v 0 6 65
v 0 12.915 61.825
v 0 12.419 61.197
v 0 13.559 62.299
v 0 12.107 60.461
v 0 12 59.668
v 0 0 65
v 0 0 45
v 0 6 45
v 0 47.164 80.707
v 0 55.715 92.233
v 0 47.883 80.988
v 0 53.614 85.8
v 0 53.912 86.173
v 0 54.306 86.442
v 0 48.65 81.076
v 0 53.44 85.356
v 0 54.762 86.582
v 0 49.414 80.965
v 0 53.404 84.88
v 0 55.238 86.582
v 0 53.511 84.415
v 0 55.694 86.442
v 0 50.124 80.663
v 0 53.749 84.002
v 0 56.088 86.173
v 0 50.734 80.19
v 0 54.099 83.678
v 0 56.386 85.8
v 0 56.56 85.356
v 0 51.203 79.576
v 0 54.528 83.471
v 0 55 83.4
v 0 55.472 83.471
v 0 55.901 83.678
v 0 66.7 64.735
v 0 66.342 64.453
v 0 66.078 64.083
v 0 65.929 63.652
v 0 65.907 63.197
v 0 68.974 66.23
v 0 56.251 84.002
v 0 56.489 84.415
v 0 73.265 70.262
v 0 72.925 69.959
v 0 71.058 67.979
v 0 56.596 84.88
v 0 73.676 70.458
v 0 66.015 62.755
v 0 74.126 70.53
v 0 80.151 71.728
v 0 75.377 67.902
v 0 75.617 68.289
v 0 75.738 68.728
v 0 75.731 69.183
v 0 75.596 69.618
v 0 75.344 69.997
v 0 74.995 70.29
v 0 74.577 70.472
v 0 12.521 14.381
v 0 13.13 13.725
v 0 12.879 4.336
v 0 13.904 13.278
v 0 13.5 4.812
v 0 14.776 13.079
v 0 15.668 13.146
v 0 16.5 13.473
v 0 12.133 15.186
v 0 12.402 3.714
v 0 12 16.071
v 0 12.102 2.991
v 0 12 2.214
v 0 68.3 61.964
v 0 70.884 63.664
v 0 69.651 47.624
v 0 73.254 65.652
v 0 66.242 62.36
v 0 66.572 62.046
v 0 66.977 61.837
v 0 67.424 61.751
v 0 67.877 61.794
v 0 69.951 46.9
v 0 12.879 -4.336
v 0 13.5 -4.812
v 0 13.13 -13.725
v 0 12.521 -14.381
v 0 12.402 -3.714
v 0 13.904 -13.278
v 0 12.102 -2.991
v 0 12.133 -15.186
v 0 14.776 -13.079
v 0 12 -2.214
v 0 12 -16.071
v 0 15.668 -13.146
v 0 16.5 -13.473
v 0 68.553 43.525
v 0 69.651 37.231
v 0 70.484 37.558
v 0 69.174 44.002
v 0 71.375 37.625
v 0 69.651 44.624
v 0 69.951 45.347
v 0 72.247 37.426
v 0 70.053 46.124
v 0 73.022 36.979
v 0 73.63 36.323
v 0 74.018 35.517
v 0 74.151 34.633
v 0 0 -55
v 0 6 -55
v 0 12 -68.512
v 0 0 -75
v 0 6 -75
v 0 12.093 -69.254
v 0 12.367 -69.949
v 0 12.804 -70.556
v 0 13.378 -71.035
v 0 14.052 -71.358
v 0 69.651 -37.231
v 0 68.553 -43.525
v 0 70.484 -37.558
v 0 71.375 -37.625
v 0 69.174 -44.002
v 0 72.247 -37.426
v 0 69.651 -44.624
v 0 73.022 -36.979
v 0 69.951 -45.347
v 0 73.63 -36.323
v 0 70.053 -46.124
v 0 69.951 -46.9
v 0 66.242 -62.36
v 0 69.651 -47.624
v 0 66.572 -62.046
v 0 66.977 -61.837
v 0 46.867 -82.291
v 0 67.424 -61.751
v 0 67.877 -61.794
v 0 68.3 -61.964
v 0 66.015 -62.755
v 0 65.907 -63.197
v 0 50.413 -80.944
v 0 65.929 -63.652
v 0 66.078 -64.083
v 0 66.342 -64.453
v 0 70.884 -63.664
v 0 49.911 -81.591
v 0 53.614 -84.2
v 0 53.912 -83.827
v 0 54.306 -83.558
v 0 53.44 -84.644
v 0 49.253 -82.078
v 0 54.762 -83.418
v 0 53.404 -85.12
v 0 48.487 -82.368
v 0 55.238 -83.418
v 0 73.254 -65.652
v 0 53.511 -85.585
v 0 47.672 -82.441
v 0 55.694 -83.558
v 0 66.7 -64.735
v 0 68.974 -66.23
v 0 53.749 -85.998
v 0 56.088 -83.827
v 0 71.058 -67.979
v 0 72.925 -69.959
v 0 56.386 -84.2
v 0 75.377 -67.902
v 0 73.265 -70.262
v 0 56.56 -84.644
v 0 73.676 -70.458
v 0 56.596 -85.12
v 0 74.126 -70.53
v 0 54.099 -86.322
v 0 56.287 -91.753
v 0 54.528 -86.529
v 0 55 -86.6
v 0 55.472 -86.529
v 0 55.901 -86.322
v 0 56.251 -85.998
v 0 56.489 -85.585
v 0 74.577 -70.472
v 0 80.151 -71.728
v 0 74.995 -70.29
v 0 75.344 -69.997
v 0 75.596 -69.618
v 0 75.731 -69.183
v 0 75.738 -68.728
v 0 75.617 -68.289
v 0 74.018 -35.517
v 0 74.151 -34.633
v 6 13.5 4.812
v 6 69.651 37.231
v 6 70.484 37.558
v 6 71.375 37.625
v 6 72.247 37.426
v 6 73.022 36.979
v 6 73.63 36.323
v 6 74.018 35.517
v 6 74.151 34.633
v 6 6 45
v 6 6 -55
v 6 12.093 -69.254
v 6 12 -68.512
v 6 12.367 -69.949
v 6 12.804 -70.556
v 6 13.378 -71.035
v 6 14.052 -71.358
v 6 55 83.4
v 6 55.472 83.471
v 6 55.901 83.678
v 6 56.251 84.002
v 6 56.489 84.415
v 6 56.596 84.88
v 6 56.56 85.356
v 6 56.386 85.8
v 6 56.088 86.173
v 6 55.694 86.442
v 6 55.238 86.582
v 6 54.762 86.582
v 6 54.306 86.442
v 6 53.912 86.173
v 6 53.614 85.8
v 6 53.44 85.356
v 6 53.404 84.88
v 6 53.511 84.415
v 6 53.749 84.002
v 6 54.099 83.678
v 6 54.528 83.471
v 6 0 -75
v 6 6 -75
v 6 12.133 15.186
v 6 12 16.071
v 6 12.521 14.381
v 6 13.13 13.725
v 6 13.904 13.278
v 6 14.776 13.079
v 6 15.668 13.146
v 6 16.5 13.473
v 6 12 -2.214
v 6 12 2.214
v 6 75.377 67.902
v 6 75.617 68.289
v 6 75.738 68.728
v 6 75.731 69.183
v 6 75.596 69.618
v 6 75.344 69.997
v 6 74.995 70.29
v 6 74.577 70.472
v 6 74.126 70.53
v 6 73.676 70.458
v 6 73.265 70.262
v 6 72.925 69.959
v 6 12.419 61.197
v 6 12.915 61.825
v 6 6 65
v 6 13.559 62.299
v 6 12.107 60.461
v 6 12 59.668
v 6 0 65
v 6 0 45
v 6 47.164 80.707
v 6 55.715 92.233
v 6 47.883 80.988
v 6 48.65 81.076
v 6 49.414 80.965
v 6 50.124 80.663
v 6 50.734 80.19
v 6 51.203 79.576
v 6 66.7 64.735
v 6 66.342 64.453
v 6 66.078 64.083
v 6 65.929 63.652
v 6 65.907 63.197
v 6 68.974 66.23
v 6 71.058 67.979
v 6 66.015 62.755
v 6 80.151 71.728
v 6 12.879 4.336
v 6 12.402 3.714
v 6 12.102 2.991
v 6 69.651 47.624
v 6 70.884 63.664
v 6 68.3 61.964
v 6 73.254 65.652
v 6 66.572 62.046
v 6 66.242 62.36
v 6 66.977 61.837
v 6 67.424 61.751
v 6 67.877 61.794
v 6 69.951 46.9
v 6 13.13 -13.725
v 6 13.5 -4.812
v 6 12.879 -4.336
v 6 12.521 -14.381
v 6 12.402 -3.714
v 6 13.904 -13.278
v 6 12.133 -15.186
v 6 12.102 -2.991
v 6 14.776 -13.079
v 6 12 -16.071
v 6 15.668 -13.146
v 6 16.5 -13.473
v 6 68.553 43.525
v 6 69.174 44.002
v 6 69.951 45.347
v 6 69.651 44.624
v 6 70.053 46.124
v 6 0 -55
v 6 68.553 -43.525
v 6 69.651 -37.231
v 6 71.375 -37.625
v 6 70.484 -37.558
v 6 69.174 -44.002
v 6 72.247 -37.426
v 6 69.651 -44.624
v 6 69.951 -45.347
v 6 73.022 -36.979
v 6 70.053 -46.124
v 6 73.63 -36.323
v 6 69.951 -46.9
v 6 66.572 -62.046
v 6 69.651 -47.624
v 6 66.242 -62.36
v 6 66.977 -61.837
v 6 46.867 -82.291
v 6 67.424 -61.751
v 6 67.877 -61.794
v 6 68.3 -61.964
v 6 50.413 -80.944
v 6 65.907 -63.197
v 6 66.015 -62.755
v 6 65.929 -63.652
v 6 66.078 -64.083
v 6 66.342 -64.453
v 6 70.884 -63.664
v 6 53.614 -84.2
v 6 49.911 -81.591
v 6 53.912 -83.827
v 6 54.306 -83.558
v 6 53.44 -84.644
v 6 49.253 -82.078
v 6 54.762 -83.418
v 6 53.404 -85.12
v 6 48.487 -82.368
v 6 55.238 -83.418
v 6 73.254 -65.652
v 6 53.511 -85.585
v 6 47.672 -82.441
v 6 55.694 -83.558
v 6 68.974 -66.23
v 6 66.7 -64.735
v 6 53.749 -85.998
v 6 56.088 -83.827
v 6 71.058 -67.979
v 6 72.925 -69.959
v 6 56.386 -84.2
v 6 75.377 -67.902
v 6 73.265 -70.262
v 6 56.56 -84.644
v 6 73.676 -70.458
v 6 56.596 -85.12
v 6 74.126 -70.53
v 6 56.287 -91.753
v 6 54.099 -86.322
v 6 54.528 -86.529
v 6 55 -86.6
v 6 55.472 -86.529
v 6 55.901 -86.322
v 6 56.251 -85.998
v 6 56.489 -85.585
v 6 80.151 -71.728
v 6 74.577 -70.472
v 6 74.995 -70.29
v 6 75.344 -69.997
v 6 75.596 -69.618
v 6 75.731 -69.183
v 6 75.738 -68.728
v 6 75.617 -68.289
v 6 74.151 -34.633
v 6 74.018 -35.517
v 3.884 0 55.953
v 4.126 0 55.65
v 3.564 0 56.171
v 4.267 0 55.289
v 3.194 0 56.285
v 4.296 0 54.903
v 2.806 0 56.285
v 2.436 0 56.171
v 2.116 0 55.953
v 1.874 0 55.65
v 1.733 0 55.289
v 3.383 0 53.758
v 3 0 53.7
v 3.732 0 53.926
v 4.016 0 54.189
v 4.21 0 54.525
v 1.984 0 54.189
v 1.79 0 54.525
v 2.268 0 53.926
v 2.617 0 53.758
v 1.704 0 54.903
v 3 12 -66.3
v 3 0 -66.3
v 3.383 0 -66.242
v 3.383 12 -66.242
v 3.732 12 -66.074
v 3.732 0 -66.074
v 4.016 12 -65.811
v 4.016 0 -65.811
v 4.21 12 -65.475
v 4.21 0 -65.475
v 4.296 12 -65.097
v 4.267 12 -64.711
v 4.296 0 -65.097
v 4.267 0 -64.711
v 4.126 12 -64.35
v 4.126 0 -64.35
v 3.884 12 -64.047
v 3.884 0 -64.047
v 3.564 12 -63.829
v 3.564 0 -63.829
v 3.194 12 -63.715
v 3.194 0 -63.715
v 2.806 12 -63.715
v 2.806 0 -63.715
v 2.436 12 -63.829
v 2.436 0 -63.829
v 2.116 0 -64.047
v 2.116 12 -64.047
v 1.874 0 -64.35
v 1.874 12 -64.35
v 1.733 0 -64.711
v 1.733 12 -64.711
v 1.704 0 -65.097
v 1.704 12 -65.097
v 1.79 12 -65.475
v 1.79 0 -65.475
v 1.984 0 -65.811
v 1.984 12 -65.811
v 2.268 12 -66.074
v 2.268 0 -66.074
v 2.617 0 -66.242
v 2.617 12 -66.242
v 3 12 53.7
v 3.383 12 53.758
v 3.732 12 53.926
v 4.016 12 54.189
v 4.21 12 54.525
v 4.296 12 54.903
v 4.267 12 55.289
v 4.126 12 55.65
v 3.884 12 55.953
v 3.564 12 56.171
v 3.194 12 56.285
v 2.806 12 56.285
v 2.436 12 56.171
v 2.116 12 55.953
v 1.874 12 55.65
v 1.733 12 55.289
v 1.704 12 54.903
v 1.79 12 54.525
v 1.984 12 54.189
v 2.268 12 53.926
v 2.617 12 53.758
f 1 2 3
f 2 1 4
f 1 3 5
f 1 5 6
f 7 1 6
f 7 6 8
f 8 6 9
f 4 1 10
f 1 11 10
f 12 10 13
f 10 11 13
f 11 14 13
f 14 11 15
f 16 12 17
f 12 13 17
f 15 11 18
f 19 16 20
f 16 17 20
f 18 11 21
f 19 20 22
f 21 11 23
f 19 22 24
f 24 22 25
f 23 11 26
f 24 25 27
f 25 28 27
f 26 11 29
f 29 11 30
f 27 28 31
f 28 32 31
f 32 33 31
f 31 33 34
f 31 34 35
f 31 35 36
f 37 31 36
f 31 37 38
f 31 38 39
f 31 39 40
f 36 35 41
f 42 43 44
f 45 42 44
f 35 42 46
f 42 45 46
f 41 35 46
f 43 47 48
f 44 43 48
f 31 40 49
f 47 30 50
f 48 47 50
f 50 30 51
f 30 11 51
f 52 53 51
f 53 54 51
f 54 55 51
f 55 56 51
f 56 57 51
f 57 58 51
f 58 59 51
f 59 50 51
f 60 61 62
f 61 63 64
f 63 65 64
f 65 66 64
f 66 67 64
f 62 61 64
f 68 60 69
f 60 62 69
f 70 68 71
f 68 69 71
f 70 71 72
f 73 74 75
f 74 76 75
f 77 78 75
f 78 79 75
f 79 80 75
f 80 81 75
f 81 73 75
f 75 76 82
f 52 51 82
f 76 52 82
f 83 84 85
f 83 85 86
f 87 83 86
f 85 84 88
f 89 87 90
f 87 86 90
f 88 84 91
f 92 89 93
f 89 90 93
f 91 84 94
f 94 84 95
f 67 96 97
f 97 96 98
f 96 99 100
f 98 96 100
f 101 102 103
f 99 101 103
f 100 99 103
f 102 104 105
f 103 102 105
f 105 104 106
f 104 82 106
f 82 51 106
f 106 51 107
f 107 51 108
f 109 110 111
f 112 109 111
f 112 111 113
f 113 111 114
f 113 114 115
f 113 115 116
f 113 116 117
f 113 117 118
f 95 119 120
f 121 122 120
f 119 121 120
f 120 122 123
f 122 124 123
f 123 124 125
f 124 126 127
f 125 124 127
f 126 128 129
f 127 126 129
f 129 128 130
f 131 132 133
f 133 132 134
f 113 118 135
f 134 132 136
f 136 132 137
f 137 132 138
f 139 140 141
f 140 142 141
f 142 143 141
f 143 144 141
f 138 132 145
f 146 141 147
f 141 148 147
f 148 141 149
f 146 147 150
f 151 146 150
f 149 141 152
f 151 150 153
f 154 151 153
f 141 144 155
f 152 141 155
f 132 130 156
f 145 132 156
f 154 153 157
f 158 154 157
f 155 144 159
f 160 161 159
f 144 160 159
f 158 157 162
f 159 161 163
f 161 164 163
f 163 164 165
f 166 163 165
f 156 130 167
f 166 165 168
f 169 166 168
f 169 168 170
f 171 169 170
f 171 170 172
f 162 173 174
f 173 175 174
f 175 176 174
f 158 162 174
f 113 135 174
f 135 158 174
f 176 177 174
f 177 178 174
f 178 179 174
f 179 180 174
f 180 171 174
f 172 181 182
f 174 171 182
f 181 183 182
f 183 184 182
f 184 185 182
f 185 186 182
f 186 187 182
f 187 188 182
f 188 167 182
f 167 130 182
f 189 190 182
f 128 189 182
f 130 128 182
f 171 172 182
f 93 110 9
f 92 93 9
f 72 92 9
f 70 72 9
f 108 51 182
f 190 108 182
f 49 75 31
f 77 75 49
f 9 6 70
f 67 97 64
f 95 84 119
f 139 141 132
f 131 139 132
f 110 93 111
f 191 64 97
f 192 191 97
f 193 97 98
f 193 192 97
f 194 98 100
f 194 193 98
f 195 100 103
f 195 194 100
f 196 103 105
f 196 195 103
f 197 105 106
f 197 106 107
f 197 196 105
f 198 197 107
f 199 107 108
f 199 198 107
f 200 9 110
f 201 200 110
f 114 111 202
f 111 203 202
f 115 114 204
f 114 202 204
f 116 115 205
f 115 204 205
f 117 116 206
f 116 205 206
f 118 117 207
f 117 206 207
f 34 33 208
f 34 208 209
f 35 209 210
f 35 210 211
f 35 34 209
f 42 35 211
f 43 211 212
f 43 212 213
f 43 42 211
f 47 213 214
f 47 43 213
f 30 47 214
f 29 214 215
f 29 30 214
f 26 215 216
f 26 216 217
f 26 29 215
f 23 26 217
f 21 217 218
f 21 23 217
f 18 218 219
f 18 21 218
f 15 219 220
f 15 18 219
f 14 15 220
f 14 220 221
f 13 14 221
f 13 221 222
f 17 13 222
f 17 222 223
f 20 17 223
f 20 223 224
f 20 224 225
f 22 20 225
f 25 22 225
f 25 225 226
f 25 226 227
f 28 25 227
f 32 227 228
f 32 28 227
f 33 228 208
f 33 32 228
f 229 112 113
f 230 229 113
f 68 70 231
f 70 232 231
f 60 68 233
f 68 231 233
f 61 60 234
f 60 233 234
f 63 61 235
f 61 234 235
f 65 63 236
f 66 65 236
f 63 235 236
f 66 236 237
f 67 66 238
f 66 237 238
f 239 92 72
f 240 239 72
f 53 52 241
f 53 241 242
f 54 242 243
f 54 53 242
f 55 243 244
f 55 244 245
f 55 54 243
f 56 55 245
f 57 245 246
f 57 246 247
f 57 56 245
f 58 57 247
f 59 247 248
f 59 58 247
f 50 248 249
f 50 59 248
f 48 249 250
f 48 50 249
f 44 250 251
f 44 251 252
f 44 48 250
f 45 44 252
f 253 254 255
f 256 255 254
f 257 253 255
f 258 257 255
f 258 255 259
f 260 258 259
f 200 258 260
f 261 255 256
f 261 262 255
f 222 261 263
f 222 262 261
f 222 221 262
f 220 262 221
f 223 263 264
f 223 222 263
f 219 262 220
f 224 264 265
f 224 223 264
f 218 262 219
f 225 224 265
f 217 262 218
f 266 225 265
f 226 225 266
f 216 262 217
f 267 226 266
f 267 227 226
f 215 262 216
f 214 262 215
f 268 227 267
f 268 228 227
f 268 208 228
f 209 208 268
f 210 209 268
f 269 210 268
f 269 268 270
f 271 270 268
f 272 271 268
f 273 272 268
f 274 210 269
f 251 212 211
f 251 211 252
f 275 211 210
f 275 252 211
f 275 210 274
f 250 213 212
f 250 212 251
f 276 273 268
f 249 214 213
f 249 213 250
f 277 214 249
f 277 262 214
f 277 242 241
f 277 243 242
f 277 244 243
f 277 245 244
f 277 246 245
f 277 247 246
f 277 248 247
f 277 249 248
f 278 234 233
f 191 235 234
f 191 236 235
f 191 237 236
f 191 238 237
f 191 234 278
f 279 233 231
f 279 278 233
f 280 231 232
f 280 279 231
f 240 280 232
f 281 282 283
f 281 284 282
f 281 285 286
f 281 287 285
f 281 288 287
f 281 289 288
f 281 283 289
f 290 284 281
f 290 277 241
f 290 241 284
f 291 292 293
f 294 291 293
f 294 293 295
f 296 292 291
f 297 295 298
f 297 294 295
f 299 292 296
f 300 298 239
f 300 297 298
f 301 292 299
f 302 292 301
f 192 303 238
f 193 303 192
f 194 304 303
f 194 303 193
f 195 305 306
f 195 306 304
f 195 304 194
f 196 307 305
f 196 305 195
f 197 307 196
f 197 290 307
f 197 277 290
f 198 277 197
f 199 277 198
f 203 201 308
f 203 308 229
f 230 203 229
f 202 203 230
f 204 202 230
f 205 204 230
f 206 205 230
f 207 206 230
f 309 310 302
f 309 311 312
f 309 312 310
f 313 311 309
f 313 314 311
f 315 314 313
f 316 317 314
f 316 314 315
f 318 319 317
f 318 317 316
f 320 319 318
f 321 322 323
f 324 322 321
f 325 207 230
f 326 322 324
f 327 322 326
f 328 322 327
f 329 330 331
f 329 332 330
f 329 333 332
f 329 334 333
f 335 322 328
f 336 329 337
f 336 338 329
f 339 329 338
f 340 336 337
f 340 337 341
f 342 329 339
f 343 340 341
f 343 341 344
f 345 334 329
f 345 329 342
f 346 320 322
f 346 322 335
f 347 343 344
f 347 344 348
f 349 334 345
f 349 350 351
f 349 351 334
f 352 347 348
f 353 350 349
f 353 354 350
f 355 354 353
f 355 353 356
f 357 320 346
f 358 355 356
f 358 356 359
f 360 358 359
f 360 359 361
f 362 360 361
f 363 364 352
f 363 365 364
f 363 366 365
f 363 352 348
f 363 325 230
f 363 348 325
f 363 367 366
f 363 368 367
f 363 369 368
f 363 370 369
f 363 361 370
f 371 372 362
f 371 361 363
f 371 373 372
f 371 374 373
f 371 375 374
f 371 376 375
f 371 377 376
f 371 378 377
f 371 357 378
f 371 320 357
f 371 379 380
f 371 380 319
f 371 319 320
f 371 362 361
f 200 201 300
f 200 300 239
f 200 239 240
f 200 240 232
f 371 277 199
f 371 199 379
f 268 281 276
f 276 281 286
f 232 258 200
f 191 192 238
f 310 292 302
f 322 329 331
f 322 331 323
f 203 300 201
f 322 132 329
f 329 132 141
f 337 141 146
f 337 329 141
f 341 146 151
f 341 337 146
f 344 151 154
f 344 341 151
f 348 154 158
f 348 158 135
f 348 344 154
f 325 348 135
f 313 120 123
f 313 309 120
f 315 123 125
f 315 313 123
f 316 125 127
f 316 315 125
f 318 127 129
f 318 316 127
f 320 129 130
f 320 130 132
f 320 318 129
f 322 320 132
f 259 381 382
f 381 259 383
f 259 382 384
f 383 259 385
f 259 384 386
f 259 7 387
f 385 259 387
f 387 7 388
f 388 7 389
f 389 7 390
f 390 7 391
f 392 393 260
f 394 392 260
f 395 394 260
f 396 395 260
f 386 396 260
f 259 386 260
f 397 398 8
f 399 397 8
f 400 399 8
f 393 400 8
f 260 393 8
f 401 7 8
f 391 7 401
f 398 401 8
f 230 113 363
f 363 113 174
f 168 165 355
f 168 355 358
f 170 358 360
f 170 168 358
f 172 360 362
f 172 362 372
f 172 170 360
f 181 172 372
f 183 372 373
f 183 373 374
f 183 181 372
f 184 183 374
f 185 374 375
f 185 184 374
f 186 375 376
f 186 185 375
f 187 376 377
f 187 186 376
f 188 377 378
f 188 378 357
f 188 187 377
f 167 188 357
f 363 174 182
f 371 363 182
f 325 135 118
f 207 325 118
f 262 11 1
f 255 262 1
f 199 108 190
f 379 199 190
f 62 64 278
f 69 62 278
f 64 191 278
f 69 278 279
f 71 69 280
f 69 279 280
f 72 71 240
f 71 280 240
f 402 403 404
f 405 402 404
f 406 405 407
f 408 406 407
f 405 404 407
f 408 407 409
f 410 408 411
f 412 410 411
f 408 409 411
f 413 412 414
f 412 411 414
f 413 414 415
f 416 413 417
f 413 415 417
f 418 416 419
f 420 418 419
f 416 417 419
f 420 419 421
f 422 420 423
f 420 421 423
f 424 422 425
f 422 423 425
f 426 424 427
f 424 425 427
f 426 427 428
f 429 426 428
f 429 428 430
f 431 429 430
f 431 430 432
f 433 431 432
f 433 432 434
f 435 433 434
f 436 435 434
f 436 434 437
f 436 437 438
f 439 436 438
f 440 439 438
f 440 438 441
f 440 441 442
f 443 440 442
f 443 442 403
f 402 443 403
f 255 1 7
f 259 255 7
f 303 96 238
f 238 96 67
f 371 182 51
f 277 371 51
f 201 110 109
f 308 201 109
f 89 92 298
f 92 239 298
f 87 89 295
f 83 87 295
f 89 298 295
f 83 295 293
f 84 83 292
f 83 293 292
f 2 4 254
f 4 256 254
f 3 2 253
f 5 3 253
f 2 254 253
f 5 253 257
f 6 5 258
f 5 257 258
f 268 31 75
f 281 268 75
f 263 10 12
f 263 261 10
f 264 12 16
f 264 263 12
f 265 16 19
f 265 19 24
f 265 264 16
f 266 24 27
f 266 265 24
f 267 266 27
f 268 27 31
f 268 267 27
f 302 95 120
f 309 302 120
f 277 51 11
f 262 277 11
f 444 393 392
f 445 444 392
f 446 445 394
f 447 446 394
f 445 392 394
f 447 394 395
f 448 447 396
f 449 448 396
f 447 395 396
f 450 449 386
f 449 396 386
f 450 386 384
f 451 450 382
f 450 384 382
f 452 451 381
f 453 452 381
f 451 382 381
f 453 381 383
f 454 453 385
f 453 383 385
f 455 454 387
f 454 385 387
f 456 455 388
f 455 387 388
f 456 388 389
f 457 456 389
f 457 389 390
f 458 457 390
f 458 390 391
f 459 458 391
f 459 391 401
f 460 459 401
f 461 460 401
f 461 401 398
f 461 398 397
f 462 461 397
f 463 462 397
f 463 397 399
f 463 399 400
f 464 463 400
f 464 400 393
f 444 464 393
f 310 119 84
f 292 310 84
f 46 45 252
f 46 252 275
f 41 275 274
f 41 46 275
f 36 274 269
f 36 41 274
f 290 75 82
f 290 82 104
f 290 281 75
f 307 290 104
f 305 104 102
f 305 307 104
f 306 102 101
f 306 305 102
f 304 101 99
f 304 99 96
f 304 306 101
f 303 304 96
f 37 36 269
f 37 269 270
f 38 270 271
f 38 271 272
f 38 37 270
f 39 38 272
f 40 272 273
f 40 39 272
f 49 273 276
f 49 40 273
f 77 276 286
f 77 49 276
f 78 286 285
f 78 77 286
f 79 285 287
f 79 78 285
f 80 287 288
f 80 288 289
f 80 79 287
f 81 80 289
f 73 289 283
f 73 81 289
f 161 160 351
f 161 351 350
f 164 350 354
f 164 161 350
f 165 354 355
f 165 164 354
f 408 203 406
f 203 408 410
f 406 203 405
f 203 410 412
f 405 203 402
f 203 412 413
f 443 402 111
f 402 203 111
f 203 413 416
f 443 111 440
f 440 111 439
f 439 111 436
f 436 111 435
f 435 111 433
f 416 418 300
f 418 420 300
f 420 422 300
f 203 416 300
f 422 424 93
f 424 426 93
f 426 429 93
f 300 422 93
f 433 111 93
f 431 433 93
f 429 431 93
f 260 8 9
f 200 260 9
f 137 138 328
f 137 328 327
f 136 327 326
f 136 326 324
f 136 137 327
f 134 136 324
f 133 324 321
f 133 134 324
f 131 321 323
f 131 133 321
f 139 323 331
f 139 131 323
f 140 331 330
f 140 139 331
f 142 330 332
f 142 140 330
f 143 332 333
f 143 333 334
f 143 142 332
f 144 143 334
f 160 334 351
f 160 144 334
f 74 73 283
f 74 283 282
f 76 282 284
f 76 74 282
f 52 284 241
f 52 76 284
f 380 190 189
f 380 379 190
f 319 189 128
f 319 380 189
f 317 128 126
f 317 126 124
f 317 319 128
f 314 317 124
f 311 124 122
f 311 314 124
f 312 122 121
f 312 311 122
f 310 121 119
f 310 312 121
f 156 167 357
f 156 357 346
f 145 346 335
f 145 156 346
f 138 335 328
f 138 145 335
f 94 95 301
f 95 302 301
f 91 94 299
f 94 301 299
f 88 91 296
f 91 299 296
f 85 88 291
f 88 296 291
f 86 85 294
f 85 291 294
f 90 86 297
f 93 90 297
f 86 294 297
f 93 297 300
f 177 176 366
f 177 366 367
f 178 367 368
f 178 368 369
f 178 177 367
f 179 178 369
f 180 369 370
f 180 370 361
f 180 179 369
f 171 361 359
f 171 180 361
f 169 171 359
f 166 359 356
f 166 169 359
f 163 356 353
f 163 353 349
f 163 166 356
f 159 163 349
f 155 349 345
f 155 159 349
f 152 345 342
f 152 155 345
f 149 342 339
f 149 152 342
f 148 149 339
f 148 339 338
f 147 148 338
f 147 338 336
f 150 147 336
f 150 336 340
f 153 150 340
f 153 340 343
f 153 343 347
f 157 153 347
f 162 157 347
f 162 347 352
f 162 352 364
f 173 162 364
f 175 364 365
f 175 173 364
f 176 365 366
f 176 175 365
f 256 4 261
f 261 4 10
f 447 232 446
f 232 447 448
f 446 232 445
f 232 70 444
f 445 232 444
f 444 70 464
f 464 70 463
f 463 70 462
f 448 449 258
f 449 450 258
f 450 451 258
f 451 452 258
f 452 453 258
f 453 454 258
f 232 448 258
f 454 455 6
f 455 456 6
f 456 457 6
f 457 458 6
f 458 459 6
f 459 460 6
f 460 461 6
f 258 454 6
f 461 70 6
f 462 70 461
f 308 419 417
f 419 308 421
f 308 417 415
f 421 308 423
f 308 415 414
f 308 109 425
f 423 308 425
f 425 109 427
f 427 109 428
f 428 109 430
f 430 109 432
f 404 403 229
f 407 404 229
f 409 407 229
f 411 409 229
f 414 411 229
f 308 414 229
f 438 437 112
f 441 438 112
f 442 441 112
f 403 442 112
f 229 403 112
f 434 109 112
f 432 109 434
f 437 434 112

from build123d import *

# Parameters (mm, degrees)
SKETCH1_R           = 1.6
BOSS_EXTRUDE1_DEPTH = 6
FILLET1_R           = 3
CUT_EXTRUDE1_REACH  = 124.34
SKETCH2_R           = 1.3


with BuildPart() as part:
    # Sketch1 → Boss-Extrude1 (new body)
    with BuildSketch(Plane(origin=(0, 0, 0), x_dir=(0, 0, -1), z_dir=(1, 0, 0))):
        Polygon((-65, 0), (-45, 0), (-45, 6), (55, 6), (55, 0), (75, 0), (75, 6), (91.752837084, 56.286625106), (71.728155707, 80.151111078), (-71.728155707, 80.151111078), (-92.232725383, 55.714716502), (-65, 6), align=None)
        with Locations((-85, 55)):
            Circle(SKETCH1_R, mode=Mode.SUBTRACT)
        with Locations((85, 55)):
            Circle(SKETCH1_R, mode=Mode.SUBTRACT)
        Polygon((-82.116733572, 49.736451418), (-45.025455014, 71.151111078), (-10.874545111, 12), (-61.445461749, 12), align=None, mode=Mode.SUBTRACT)
        Polygon((-39.829302592, 74.151111078), (39.829302592, 74.151111078), (3.94634188, 12), (-3.94634188, 12), align=None, mode=Mode.SUBTRACT)
        Polygon((45.025455014, 71.151111078), (83.06422235, 49.189418517), (70.674680035, 12), (10.874545111, 12), align=None, mode=Mode.SUBTRACT)
        with BuildLine():
            ThreePointArc((-61.963724259, 68.3), (-64.623217813, 72.098150418), (-67.901849582, 75.376782187))
            ThreePointArc((-67.901849582, 75.376782187), (-70.155980867, 75.179571253), (-69.958769933, 72.925439969))
            ThreePointArc((-69.958769933, 72.925439969), (-67.074560031, 70.041230067), (-64.735005551, 66.7))
            ThreePointArc((-64.735005551, 66.7), (-62.549364905, 66.114359354), (-61.963724259, 68.3))
        make_face(mode=Mode.SUBTRACT)
        with BuildLine():
            ThreePointArc((67.901849582, 75.376782187), (64.623217813, 72.098150418), (61.963724259, 68.3))
            ThreePointArc((61.963724259, 68.3), (62.549364905, 66.114359354), (64.735005551, 66.7))
            ThreePointArc((64.735005551, 66.7), (67.074560031, 70.041230067), (69.958769933, 72.925439969))
            ThreePointArc((69.958769933, 72.925439969), (70.155980867, 75.179571253), (67.901849582, 75.376782187))
        make_face(mode=Mode.SUBTRACT)
    extrude(amount=BOSS_EXTRUDE1_DEPTH)

    # Fillet1
    fillet1_edges = [part.edges().sort_by_distance(p)[0] for p in [
        (3, 49.736451418, 82.116733572),
        (3, 12, 61.445461749),
        (3, 12, 10.874545111),
        (3, 71.151111078, 45.025455014),
        (3, 74.151111078, 39.829302592),
        (3, 12, 3.94634188),
        (3, 12, -3.94634188),
        (3, 74.151111078, -39.829302592),
        (3, 71.151111078, -45.025455014),
        (3, 12, -10.874545111),
        (3, 12, -70.674680035),
        (3, 49.189418517, -83.06422235),
    ]]
    fillet(fillet1_edges, radius=FILLET1_R)

    # Sketch2 → Cut-Extrude1 (cut, up to next)
    with BuildSketch(Plane.XZ, mode=Mode.PRIVATE) as cut_extrude1_sk1:
        with Locations(Location((3, 55, 0), (0, 0, 270))):
            Circle(SKETCH2_R)
    cut_extrude1_tool1 = extrude(cut_extrude1_sk1.sketch, amount=-CUT_EXTRUDE1_REACH, mode=Mode.PRIVATE) & part.part
    # Sketch2 → Cut-Extrude1 (cut, up to next)
    with BuildSketch(Plane.XZ, mode=Mode.PRIVATE) as cut_extrude1_sk2:
        with Locations(Location((3, -65, 0), (0, 0, 270))):
            Circle(SKETCH2_R)
    cut_extrude1_tool2 = extrude(cut_extrude1_sk2.sketch, amount=-CUT_EXTRUDE1_REACH, mode=Mode.PRIVATE) & part.part
    add(cut_extrude1_tool1.solids().sort_by_distance((3, 0, 55))[0], mode=Mode.SUBTRACT)
    add(cut_extrude1_tool2.solids().sort_by_distance((3, 0, -65))[0], mode=Mode.SUBTRACT)


solid = part.part
